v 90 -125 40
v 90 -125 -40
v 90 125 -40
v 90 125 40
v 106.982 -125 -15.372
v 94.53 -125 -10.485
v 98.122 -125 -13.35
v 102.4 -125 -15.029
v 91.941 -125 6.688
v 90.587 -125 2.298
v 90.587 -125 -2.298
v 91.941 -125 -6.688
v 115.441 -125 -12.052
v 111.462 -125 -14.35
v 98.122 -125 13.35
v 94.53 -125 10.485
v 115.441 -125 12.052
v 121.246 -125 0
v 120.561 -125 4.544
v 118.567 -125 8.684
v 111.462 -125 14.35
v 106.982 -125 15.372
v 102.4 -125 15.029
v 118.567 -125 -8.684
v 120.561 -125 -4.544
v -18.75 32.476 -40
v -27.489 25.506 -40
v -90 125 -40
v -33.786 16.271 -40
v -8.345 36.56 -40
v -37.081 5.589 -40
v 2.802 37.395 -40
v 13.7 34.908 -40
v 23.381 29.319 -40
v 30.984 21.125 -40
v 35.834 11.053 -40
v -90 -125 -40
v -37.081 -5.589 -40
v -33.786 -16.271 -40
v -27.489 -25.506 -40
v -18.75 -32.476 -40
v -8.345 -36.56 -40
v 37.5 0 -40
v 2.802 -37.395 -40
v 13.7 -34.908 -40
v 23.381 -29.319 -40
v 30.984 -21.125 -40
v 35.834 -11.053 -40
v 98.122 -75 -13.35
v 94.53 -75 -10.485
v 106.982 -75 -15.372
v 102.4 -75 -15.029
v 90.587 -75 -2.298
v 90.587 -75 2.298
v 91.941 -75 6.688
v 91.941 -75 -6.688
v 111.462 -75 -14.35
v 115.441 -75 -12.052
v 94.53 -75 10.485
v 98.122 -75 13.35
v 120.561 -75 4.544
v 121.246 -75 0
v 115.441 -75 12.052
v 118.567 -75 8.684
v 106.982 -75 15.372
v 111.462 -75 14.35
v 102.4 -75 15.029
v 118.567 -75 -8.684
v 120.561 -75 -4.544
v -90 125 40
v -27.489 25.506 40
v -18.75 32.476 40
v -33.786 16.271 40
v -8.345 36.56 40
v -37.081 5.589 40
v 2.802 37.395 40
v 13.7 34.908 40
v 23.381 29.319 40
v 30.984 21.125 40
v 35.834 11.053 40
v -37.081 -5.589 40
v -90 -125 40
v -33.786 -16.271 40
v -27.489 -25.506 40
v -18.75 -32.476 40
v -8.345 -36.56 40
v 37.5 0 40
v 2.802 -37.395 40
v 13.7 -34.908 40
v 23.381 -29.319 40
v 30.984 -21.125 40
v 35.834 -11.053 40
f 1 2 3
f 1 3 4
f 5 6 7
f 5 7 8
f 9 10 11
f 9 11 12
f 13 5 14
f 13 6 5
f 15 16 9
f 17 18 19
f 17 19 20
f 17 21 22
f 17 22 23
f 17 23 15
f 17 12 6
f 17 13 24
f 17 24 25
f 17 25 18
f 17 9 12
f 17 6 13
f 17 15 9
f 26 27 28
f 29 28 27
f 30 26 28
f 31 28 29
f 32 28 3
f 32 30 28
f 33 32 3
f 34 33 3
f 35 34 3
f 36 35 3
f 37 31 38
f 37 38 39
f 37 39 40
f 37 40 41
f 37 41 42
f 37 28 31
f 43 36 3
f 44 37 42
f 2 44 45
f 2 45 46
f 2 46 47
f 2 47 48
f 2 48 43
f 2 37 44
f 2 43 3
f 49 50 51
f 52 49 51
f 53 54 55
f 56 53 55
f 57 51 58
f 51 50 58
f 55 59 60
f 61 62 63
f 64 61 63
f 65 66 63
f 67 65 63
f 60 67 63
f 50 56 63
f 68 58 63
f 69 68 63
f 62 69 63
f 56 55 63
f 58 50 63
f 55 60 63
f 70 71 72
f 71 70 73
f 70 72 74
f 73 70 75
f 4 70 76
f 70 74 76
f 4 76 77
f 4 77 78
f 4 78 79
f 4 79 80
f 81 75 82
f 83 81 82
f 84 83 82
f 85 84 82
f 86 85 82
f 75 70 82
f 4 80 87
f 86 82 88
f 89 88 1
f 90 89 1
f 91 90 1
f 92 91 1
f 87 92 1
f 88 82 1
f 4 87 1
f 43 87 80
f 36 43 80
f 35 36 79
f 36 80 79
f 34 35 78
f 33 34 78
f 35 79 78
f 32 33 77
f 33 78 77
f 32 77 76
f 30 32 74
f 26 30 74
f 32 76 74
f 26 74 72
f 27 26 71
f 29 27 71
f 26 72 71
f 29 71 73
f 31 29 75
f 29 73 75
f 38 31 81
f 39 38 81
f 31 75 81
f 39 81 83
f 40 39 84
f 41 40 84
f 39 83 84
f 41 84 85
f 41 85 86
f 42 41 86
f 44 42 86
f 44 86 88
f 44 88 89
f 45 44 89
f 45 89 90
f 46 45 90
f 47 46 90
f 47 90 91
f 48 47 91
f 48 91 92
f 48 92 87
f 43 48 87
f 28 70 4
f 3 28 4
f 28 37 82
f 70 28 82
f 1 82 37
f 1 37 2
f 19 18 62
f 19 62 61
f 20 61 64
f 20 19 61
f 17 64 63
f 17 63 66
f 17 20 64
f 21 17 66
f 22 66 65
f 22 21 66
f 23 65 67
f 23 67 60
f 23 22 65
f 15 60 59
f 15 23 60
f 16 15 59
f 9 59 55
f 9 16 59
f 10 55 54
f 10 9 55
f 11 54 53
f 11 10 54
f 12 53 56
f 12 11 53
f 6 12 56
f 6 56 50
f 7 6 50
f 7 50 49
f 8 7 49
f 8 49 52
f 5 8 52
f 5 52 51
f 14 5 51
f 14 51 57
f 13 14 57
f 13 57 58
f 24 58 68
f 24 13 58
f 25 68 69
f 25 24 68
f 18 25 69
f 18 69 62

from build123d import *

# Parameters (mm, degrees)
F0_W     = 180
F0_H     = 80
F1_DEPTH = 125
F2_R     = 37.5
F3_DEPTH = 100
F5_R     = 15.415379
F6_DEPTH = 50


with BuildPart() as f1:
    # F0 (on Front) → F1 (new body, symmetric)
    with BuildSketch(Plane.XZ):
        Rectangle(F0_W, F0_H)
    extrude(amount=F1_DEPTH, both=True)

    # F2 (on face) → F3 (cut)
    with BuildSketch(Plane.XY.offset(40)):
        Circle(F2_R)
    extrude(amount=-F3_DEPTH, mode=Mode.SUBTRACT)


with BuildPart() as f6:
    # F5 (on offset) → F6 (new body)
    with BuildSketch(Plane.XZ.offset(125)):
        with Locations((105.830133, 0)):
            Circle(F5_R)
    extrude(amount=-F6_DEPTH)


solid = Compound([f1.part, f6.part])
